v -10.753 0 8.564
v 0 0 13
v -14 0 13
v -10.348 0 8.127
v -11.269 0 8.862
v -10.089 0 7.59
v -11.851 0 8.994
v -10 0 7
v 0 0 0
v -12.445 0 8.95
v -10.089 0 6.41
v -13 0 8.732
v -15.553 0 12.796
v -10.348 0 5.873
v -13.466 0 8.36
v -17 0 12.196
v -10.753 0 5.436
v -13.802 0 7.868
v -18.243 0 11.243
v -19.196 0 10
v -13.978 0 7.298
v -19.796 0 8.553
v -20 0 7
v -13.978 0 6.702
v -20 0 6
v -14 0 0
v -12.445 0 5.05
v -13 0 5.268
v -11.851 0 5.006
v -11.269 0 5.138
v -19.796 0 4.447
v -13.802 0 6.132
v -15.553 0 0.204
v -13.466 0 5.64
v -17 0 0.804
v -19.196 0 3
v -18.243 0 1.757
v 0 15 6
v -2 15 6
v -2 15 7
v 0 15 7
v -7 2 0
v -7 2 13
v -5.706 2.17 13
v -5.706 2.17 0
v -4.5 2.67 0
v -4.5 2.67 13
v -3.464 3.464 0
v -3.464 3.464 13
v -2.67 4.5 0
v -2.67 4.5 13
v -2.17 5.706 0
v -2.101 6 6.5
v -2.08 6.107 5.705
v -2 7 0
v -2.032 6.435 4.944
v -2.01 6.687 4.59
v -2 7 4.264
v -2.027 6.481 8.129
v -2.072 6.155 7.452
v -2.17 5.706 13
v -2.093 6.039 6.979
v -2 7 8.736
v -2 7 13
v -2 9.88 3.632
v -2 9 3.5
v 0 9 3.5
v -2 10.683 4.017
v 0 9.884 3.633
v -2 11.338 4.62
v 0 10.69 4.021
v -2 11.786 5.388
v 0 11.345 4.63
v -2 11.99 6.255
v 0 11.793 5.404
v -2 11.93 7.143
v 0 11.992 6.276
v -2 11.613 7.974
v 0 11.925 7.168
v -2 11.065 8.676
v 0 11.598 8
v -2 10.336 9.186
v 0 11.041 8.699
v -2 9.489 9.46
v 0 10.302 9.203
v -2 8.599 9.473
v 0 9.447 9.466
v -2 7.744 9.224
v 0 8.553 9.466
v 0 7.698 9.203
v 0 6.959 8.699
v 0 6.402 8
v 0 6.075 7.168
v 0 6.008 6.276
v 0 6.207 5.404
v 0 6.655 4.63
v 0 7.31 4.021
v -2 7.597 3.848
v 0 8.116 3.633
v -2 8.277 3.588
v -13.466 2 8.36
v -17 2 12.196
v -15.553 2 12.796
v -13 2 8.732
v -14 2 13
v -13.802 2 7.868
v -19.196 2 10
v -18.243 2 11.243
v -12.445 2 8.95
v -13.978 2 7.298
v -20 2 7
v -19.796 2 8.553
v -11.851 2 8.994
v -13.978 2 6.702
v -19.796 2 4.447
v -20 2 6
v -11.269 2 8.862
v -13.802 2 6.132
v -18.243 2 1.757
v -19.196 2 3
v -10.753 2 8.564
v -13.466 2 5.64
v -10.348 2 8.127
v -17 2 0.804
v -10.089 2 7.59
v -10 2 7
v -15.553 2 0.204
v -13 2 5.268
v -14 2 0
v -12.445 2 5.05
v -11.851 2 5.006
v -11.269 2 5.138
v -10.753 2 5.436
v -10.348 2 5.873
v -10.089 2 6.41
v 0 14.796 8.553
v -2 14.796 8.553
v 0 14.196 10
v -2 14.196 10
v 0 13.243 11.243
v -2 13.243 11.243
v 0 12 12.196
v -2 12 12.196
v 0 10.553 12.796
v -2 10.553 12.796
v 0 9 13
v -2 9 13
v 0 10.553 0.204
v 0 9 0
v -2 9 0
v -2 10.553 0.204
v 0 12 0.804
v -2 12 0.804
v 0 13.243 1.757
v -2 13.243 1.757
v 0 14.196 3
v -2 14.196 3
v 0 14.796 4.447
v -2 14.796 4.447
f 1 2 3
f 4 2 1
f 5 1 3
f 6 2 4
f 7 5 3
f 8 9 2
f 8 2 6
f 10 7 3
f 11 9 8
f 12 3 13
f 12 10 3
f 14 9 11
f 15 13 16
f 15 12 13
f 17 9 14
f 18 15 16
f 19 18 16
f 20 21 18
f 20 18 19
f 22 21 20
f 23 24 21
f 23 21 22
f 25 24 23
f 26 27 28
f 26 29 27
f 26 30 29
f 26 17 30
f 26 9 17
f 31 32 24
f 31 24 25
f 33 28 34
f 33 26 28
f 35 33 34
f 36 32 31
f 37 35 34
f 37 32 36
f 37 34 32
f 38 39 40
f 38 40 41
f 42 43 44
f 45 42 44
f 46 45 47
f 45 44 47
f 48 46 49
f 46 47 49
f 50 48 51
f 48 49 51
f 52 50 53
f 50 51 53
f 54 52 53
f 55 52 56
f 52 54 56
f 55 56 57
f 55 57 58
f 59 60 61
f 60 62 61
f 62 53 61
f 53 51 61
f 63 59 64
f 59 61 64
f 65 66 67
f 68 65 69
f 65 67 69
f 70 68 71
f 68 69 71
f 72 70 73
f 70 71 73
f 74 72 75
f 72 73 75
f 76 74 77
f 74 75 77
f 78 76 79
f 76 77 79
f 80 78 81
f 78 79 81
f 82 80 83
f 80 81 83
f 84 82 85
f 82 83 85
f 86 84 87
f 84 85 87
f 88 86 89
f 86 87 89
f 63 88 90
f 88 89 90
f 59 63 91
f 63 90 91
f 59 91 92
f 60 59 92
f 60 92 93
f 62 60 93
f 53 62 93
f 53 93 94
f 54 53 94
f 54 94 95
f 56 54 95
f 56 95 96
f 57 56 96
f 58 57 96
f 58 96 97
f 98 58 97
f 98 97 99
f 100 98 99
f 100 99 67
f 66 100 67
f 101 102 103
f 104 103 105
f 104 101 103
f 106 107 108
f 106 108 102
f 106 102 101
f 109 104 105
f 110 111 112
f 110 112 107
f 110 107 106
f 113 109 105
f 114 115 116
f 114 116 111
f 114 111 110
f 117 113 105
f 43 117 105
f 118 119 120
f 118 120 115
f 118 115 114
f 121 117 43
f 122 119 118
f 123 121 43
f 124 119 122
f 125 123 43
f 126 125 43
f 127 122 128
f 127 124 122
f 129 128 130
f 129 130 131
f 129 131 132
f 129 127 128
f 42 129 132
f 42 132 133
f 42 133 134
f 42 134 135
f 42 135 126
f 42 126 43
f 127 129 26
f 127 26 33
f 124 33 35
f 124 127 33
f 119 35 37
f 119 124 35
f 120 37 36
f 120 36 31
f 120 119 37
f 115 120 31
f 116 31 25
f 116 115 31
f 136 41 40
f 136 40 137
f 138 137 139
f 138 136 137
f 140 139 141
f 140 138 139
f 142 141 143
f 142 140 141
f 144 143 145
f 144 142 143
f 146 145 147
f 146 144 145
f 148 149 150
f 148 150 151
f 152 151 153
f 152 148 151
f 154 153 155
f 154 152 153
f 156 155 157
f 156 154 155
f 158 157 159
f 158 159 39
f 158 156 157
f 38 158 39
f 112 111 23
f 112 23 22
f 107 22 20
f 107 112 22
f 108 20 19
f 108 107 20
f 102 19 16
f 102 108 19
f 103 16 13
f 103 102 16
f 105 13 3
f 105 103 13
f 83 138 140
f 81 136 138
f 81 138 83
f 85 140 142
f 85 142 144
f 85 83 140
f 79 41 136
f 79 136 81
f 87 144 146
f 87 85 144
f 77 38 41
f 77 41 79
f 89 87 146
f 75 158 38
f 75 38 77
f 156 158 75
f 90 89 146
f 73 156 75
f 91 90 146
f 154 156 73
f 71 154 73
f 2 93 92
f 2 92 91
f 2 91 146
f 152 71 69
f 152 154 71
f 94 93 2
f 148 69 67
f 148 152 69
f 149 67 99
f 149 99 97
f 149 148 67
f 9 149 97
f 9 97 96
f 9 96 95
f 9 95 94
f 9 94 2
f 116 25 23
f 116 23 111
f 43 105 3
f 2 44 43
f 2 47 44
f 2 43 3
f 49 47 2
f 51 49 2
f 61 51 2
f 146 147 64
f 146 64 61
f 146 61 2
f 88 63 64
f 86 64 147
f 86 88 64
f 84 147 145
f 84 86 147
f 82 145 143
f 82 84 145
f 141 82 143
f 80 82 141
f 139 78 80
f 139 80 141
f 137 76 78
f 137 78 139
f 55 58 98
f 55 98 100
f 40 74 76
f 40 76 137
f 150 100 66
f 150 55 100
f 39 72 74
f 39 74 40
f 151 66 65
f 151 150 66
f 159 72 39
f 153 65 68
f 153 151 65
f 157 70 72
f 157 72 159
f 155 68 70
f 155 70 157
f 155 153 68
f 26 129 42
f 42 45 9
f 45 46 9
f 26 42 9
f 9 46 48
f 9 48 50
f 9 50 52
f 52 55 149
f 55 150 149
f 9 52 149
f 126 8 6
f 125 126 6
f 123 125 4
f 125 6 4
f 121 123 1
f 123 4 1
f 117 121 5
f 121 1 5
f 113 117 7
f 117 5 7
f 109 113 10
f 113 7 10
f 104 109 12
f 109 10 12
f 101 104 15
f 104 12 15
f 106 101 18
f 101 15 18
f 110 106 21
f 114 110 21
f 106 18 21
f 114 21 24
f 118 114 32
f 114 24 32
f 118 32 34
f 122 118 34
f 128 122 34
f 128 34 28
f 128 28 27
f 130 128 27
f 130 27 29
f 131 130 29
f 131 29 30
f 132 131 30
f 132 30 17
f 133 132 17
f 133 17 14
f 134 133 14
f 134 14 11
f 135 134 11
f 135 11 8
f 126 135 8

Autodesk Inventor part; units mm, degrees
ref_plane "YZ Plane" through (0, 0, 0) normal (1, 0, 0) x (0, 1, 0)
ref_plane "XZ Plane" through (0, 0, 0) normal (0, 1, 0) x (-1, 0, 0)
ref_plane "XY Plane" through (0, 0, 0) normal (0, 0, 1) x (1, 0, 0)
sketch "Sketch1" plane through (0, 0, 0) normal (0, 0, 1) x (1, 0, 0)
  line L0 (0, 0) -> (-20, 0)
  line L1 (-20, 0) -> (-20, 2)
  line L2 (-20, 2) -> (0, 2)
  line L3 (0, 2) -> (0, 0)
  line L4 (0, 0) -> (-2, 0)
  line L5 (-2, 0) -> (-2, 15)
  line L6 (-2, 15) -> (0, 15)
  line L7 (0, 15) -> (0, 0)
  point P0 (-2, 2)
  dimension "d0" = 20
  dimension "d1" = 2
  dimension "d2" = 2
  dimension "d3" = 15
extrude "Extrusion1" add sketch "Sketch1" along normal blind 13
fillet "Fillet1" radius 5 1 edges at (-2, 2, 6.5)
fillet "Fillet2" radius 6 4 edges at (-1, 15, 13) (-1, 15, 0) (-20, 1, 13) (-20, 1, 0)
sketch "Sketch2" plane through (0, 0, 13) normal (1, 0, 0) x (0, 0, -1)
  line L0 (13, 0) -> (0, 0) projected
  line L1 (6.5, 0) -> (6.5, 9)
  circle A0 centre (6.5, 9) radius 3
  dimension "d8" = 9
  dimension "d9" = 6
extrude "Extrusion2" cut sketch "Sketch2" against normal blind 13
sketch "Sketch3" plane through (0, 0, 0) normal (0, -1, 0) x (1, 0, 0)
  line L0 (0, 7) -> (-2, 7) projected
  line L1 (0, 7) -> (-12, 7)
  circle A0 centre (-12, 7) radius 2
  point P0 (0, 0)
  dimension "d12" = 12
  dimension "d13" = 4
extrude "Extrusion3" cut sketch "Sketch3" against normal blind 13
properties part number "prependicular"
